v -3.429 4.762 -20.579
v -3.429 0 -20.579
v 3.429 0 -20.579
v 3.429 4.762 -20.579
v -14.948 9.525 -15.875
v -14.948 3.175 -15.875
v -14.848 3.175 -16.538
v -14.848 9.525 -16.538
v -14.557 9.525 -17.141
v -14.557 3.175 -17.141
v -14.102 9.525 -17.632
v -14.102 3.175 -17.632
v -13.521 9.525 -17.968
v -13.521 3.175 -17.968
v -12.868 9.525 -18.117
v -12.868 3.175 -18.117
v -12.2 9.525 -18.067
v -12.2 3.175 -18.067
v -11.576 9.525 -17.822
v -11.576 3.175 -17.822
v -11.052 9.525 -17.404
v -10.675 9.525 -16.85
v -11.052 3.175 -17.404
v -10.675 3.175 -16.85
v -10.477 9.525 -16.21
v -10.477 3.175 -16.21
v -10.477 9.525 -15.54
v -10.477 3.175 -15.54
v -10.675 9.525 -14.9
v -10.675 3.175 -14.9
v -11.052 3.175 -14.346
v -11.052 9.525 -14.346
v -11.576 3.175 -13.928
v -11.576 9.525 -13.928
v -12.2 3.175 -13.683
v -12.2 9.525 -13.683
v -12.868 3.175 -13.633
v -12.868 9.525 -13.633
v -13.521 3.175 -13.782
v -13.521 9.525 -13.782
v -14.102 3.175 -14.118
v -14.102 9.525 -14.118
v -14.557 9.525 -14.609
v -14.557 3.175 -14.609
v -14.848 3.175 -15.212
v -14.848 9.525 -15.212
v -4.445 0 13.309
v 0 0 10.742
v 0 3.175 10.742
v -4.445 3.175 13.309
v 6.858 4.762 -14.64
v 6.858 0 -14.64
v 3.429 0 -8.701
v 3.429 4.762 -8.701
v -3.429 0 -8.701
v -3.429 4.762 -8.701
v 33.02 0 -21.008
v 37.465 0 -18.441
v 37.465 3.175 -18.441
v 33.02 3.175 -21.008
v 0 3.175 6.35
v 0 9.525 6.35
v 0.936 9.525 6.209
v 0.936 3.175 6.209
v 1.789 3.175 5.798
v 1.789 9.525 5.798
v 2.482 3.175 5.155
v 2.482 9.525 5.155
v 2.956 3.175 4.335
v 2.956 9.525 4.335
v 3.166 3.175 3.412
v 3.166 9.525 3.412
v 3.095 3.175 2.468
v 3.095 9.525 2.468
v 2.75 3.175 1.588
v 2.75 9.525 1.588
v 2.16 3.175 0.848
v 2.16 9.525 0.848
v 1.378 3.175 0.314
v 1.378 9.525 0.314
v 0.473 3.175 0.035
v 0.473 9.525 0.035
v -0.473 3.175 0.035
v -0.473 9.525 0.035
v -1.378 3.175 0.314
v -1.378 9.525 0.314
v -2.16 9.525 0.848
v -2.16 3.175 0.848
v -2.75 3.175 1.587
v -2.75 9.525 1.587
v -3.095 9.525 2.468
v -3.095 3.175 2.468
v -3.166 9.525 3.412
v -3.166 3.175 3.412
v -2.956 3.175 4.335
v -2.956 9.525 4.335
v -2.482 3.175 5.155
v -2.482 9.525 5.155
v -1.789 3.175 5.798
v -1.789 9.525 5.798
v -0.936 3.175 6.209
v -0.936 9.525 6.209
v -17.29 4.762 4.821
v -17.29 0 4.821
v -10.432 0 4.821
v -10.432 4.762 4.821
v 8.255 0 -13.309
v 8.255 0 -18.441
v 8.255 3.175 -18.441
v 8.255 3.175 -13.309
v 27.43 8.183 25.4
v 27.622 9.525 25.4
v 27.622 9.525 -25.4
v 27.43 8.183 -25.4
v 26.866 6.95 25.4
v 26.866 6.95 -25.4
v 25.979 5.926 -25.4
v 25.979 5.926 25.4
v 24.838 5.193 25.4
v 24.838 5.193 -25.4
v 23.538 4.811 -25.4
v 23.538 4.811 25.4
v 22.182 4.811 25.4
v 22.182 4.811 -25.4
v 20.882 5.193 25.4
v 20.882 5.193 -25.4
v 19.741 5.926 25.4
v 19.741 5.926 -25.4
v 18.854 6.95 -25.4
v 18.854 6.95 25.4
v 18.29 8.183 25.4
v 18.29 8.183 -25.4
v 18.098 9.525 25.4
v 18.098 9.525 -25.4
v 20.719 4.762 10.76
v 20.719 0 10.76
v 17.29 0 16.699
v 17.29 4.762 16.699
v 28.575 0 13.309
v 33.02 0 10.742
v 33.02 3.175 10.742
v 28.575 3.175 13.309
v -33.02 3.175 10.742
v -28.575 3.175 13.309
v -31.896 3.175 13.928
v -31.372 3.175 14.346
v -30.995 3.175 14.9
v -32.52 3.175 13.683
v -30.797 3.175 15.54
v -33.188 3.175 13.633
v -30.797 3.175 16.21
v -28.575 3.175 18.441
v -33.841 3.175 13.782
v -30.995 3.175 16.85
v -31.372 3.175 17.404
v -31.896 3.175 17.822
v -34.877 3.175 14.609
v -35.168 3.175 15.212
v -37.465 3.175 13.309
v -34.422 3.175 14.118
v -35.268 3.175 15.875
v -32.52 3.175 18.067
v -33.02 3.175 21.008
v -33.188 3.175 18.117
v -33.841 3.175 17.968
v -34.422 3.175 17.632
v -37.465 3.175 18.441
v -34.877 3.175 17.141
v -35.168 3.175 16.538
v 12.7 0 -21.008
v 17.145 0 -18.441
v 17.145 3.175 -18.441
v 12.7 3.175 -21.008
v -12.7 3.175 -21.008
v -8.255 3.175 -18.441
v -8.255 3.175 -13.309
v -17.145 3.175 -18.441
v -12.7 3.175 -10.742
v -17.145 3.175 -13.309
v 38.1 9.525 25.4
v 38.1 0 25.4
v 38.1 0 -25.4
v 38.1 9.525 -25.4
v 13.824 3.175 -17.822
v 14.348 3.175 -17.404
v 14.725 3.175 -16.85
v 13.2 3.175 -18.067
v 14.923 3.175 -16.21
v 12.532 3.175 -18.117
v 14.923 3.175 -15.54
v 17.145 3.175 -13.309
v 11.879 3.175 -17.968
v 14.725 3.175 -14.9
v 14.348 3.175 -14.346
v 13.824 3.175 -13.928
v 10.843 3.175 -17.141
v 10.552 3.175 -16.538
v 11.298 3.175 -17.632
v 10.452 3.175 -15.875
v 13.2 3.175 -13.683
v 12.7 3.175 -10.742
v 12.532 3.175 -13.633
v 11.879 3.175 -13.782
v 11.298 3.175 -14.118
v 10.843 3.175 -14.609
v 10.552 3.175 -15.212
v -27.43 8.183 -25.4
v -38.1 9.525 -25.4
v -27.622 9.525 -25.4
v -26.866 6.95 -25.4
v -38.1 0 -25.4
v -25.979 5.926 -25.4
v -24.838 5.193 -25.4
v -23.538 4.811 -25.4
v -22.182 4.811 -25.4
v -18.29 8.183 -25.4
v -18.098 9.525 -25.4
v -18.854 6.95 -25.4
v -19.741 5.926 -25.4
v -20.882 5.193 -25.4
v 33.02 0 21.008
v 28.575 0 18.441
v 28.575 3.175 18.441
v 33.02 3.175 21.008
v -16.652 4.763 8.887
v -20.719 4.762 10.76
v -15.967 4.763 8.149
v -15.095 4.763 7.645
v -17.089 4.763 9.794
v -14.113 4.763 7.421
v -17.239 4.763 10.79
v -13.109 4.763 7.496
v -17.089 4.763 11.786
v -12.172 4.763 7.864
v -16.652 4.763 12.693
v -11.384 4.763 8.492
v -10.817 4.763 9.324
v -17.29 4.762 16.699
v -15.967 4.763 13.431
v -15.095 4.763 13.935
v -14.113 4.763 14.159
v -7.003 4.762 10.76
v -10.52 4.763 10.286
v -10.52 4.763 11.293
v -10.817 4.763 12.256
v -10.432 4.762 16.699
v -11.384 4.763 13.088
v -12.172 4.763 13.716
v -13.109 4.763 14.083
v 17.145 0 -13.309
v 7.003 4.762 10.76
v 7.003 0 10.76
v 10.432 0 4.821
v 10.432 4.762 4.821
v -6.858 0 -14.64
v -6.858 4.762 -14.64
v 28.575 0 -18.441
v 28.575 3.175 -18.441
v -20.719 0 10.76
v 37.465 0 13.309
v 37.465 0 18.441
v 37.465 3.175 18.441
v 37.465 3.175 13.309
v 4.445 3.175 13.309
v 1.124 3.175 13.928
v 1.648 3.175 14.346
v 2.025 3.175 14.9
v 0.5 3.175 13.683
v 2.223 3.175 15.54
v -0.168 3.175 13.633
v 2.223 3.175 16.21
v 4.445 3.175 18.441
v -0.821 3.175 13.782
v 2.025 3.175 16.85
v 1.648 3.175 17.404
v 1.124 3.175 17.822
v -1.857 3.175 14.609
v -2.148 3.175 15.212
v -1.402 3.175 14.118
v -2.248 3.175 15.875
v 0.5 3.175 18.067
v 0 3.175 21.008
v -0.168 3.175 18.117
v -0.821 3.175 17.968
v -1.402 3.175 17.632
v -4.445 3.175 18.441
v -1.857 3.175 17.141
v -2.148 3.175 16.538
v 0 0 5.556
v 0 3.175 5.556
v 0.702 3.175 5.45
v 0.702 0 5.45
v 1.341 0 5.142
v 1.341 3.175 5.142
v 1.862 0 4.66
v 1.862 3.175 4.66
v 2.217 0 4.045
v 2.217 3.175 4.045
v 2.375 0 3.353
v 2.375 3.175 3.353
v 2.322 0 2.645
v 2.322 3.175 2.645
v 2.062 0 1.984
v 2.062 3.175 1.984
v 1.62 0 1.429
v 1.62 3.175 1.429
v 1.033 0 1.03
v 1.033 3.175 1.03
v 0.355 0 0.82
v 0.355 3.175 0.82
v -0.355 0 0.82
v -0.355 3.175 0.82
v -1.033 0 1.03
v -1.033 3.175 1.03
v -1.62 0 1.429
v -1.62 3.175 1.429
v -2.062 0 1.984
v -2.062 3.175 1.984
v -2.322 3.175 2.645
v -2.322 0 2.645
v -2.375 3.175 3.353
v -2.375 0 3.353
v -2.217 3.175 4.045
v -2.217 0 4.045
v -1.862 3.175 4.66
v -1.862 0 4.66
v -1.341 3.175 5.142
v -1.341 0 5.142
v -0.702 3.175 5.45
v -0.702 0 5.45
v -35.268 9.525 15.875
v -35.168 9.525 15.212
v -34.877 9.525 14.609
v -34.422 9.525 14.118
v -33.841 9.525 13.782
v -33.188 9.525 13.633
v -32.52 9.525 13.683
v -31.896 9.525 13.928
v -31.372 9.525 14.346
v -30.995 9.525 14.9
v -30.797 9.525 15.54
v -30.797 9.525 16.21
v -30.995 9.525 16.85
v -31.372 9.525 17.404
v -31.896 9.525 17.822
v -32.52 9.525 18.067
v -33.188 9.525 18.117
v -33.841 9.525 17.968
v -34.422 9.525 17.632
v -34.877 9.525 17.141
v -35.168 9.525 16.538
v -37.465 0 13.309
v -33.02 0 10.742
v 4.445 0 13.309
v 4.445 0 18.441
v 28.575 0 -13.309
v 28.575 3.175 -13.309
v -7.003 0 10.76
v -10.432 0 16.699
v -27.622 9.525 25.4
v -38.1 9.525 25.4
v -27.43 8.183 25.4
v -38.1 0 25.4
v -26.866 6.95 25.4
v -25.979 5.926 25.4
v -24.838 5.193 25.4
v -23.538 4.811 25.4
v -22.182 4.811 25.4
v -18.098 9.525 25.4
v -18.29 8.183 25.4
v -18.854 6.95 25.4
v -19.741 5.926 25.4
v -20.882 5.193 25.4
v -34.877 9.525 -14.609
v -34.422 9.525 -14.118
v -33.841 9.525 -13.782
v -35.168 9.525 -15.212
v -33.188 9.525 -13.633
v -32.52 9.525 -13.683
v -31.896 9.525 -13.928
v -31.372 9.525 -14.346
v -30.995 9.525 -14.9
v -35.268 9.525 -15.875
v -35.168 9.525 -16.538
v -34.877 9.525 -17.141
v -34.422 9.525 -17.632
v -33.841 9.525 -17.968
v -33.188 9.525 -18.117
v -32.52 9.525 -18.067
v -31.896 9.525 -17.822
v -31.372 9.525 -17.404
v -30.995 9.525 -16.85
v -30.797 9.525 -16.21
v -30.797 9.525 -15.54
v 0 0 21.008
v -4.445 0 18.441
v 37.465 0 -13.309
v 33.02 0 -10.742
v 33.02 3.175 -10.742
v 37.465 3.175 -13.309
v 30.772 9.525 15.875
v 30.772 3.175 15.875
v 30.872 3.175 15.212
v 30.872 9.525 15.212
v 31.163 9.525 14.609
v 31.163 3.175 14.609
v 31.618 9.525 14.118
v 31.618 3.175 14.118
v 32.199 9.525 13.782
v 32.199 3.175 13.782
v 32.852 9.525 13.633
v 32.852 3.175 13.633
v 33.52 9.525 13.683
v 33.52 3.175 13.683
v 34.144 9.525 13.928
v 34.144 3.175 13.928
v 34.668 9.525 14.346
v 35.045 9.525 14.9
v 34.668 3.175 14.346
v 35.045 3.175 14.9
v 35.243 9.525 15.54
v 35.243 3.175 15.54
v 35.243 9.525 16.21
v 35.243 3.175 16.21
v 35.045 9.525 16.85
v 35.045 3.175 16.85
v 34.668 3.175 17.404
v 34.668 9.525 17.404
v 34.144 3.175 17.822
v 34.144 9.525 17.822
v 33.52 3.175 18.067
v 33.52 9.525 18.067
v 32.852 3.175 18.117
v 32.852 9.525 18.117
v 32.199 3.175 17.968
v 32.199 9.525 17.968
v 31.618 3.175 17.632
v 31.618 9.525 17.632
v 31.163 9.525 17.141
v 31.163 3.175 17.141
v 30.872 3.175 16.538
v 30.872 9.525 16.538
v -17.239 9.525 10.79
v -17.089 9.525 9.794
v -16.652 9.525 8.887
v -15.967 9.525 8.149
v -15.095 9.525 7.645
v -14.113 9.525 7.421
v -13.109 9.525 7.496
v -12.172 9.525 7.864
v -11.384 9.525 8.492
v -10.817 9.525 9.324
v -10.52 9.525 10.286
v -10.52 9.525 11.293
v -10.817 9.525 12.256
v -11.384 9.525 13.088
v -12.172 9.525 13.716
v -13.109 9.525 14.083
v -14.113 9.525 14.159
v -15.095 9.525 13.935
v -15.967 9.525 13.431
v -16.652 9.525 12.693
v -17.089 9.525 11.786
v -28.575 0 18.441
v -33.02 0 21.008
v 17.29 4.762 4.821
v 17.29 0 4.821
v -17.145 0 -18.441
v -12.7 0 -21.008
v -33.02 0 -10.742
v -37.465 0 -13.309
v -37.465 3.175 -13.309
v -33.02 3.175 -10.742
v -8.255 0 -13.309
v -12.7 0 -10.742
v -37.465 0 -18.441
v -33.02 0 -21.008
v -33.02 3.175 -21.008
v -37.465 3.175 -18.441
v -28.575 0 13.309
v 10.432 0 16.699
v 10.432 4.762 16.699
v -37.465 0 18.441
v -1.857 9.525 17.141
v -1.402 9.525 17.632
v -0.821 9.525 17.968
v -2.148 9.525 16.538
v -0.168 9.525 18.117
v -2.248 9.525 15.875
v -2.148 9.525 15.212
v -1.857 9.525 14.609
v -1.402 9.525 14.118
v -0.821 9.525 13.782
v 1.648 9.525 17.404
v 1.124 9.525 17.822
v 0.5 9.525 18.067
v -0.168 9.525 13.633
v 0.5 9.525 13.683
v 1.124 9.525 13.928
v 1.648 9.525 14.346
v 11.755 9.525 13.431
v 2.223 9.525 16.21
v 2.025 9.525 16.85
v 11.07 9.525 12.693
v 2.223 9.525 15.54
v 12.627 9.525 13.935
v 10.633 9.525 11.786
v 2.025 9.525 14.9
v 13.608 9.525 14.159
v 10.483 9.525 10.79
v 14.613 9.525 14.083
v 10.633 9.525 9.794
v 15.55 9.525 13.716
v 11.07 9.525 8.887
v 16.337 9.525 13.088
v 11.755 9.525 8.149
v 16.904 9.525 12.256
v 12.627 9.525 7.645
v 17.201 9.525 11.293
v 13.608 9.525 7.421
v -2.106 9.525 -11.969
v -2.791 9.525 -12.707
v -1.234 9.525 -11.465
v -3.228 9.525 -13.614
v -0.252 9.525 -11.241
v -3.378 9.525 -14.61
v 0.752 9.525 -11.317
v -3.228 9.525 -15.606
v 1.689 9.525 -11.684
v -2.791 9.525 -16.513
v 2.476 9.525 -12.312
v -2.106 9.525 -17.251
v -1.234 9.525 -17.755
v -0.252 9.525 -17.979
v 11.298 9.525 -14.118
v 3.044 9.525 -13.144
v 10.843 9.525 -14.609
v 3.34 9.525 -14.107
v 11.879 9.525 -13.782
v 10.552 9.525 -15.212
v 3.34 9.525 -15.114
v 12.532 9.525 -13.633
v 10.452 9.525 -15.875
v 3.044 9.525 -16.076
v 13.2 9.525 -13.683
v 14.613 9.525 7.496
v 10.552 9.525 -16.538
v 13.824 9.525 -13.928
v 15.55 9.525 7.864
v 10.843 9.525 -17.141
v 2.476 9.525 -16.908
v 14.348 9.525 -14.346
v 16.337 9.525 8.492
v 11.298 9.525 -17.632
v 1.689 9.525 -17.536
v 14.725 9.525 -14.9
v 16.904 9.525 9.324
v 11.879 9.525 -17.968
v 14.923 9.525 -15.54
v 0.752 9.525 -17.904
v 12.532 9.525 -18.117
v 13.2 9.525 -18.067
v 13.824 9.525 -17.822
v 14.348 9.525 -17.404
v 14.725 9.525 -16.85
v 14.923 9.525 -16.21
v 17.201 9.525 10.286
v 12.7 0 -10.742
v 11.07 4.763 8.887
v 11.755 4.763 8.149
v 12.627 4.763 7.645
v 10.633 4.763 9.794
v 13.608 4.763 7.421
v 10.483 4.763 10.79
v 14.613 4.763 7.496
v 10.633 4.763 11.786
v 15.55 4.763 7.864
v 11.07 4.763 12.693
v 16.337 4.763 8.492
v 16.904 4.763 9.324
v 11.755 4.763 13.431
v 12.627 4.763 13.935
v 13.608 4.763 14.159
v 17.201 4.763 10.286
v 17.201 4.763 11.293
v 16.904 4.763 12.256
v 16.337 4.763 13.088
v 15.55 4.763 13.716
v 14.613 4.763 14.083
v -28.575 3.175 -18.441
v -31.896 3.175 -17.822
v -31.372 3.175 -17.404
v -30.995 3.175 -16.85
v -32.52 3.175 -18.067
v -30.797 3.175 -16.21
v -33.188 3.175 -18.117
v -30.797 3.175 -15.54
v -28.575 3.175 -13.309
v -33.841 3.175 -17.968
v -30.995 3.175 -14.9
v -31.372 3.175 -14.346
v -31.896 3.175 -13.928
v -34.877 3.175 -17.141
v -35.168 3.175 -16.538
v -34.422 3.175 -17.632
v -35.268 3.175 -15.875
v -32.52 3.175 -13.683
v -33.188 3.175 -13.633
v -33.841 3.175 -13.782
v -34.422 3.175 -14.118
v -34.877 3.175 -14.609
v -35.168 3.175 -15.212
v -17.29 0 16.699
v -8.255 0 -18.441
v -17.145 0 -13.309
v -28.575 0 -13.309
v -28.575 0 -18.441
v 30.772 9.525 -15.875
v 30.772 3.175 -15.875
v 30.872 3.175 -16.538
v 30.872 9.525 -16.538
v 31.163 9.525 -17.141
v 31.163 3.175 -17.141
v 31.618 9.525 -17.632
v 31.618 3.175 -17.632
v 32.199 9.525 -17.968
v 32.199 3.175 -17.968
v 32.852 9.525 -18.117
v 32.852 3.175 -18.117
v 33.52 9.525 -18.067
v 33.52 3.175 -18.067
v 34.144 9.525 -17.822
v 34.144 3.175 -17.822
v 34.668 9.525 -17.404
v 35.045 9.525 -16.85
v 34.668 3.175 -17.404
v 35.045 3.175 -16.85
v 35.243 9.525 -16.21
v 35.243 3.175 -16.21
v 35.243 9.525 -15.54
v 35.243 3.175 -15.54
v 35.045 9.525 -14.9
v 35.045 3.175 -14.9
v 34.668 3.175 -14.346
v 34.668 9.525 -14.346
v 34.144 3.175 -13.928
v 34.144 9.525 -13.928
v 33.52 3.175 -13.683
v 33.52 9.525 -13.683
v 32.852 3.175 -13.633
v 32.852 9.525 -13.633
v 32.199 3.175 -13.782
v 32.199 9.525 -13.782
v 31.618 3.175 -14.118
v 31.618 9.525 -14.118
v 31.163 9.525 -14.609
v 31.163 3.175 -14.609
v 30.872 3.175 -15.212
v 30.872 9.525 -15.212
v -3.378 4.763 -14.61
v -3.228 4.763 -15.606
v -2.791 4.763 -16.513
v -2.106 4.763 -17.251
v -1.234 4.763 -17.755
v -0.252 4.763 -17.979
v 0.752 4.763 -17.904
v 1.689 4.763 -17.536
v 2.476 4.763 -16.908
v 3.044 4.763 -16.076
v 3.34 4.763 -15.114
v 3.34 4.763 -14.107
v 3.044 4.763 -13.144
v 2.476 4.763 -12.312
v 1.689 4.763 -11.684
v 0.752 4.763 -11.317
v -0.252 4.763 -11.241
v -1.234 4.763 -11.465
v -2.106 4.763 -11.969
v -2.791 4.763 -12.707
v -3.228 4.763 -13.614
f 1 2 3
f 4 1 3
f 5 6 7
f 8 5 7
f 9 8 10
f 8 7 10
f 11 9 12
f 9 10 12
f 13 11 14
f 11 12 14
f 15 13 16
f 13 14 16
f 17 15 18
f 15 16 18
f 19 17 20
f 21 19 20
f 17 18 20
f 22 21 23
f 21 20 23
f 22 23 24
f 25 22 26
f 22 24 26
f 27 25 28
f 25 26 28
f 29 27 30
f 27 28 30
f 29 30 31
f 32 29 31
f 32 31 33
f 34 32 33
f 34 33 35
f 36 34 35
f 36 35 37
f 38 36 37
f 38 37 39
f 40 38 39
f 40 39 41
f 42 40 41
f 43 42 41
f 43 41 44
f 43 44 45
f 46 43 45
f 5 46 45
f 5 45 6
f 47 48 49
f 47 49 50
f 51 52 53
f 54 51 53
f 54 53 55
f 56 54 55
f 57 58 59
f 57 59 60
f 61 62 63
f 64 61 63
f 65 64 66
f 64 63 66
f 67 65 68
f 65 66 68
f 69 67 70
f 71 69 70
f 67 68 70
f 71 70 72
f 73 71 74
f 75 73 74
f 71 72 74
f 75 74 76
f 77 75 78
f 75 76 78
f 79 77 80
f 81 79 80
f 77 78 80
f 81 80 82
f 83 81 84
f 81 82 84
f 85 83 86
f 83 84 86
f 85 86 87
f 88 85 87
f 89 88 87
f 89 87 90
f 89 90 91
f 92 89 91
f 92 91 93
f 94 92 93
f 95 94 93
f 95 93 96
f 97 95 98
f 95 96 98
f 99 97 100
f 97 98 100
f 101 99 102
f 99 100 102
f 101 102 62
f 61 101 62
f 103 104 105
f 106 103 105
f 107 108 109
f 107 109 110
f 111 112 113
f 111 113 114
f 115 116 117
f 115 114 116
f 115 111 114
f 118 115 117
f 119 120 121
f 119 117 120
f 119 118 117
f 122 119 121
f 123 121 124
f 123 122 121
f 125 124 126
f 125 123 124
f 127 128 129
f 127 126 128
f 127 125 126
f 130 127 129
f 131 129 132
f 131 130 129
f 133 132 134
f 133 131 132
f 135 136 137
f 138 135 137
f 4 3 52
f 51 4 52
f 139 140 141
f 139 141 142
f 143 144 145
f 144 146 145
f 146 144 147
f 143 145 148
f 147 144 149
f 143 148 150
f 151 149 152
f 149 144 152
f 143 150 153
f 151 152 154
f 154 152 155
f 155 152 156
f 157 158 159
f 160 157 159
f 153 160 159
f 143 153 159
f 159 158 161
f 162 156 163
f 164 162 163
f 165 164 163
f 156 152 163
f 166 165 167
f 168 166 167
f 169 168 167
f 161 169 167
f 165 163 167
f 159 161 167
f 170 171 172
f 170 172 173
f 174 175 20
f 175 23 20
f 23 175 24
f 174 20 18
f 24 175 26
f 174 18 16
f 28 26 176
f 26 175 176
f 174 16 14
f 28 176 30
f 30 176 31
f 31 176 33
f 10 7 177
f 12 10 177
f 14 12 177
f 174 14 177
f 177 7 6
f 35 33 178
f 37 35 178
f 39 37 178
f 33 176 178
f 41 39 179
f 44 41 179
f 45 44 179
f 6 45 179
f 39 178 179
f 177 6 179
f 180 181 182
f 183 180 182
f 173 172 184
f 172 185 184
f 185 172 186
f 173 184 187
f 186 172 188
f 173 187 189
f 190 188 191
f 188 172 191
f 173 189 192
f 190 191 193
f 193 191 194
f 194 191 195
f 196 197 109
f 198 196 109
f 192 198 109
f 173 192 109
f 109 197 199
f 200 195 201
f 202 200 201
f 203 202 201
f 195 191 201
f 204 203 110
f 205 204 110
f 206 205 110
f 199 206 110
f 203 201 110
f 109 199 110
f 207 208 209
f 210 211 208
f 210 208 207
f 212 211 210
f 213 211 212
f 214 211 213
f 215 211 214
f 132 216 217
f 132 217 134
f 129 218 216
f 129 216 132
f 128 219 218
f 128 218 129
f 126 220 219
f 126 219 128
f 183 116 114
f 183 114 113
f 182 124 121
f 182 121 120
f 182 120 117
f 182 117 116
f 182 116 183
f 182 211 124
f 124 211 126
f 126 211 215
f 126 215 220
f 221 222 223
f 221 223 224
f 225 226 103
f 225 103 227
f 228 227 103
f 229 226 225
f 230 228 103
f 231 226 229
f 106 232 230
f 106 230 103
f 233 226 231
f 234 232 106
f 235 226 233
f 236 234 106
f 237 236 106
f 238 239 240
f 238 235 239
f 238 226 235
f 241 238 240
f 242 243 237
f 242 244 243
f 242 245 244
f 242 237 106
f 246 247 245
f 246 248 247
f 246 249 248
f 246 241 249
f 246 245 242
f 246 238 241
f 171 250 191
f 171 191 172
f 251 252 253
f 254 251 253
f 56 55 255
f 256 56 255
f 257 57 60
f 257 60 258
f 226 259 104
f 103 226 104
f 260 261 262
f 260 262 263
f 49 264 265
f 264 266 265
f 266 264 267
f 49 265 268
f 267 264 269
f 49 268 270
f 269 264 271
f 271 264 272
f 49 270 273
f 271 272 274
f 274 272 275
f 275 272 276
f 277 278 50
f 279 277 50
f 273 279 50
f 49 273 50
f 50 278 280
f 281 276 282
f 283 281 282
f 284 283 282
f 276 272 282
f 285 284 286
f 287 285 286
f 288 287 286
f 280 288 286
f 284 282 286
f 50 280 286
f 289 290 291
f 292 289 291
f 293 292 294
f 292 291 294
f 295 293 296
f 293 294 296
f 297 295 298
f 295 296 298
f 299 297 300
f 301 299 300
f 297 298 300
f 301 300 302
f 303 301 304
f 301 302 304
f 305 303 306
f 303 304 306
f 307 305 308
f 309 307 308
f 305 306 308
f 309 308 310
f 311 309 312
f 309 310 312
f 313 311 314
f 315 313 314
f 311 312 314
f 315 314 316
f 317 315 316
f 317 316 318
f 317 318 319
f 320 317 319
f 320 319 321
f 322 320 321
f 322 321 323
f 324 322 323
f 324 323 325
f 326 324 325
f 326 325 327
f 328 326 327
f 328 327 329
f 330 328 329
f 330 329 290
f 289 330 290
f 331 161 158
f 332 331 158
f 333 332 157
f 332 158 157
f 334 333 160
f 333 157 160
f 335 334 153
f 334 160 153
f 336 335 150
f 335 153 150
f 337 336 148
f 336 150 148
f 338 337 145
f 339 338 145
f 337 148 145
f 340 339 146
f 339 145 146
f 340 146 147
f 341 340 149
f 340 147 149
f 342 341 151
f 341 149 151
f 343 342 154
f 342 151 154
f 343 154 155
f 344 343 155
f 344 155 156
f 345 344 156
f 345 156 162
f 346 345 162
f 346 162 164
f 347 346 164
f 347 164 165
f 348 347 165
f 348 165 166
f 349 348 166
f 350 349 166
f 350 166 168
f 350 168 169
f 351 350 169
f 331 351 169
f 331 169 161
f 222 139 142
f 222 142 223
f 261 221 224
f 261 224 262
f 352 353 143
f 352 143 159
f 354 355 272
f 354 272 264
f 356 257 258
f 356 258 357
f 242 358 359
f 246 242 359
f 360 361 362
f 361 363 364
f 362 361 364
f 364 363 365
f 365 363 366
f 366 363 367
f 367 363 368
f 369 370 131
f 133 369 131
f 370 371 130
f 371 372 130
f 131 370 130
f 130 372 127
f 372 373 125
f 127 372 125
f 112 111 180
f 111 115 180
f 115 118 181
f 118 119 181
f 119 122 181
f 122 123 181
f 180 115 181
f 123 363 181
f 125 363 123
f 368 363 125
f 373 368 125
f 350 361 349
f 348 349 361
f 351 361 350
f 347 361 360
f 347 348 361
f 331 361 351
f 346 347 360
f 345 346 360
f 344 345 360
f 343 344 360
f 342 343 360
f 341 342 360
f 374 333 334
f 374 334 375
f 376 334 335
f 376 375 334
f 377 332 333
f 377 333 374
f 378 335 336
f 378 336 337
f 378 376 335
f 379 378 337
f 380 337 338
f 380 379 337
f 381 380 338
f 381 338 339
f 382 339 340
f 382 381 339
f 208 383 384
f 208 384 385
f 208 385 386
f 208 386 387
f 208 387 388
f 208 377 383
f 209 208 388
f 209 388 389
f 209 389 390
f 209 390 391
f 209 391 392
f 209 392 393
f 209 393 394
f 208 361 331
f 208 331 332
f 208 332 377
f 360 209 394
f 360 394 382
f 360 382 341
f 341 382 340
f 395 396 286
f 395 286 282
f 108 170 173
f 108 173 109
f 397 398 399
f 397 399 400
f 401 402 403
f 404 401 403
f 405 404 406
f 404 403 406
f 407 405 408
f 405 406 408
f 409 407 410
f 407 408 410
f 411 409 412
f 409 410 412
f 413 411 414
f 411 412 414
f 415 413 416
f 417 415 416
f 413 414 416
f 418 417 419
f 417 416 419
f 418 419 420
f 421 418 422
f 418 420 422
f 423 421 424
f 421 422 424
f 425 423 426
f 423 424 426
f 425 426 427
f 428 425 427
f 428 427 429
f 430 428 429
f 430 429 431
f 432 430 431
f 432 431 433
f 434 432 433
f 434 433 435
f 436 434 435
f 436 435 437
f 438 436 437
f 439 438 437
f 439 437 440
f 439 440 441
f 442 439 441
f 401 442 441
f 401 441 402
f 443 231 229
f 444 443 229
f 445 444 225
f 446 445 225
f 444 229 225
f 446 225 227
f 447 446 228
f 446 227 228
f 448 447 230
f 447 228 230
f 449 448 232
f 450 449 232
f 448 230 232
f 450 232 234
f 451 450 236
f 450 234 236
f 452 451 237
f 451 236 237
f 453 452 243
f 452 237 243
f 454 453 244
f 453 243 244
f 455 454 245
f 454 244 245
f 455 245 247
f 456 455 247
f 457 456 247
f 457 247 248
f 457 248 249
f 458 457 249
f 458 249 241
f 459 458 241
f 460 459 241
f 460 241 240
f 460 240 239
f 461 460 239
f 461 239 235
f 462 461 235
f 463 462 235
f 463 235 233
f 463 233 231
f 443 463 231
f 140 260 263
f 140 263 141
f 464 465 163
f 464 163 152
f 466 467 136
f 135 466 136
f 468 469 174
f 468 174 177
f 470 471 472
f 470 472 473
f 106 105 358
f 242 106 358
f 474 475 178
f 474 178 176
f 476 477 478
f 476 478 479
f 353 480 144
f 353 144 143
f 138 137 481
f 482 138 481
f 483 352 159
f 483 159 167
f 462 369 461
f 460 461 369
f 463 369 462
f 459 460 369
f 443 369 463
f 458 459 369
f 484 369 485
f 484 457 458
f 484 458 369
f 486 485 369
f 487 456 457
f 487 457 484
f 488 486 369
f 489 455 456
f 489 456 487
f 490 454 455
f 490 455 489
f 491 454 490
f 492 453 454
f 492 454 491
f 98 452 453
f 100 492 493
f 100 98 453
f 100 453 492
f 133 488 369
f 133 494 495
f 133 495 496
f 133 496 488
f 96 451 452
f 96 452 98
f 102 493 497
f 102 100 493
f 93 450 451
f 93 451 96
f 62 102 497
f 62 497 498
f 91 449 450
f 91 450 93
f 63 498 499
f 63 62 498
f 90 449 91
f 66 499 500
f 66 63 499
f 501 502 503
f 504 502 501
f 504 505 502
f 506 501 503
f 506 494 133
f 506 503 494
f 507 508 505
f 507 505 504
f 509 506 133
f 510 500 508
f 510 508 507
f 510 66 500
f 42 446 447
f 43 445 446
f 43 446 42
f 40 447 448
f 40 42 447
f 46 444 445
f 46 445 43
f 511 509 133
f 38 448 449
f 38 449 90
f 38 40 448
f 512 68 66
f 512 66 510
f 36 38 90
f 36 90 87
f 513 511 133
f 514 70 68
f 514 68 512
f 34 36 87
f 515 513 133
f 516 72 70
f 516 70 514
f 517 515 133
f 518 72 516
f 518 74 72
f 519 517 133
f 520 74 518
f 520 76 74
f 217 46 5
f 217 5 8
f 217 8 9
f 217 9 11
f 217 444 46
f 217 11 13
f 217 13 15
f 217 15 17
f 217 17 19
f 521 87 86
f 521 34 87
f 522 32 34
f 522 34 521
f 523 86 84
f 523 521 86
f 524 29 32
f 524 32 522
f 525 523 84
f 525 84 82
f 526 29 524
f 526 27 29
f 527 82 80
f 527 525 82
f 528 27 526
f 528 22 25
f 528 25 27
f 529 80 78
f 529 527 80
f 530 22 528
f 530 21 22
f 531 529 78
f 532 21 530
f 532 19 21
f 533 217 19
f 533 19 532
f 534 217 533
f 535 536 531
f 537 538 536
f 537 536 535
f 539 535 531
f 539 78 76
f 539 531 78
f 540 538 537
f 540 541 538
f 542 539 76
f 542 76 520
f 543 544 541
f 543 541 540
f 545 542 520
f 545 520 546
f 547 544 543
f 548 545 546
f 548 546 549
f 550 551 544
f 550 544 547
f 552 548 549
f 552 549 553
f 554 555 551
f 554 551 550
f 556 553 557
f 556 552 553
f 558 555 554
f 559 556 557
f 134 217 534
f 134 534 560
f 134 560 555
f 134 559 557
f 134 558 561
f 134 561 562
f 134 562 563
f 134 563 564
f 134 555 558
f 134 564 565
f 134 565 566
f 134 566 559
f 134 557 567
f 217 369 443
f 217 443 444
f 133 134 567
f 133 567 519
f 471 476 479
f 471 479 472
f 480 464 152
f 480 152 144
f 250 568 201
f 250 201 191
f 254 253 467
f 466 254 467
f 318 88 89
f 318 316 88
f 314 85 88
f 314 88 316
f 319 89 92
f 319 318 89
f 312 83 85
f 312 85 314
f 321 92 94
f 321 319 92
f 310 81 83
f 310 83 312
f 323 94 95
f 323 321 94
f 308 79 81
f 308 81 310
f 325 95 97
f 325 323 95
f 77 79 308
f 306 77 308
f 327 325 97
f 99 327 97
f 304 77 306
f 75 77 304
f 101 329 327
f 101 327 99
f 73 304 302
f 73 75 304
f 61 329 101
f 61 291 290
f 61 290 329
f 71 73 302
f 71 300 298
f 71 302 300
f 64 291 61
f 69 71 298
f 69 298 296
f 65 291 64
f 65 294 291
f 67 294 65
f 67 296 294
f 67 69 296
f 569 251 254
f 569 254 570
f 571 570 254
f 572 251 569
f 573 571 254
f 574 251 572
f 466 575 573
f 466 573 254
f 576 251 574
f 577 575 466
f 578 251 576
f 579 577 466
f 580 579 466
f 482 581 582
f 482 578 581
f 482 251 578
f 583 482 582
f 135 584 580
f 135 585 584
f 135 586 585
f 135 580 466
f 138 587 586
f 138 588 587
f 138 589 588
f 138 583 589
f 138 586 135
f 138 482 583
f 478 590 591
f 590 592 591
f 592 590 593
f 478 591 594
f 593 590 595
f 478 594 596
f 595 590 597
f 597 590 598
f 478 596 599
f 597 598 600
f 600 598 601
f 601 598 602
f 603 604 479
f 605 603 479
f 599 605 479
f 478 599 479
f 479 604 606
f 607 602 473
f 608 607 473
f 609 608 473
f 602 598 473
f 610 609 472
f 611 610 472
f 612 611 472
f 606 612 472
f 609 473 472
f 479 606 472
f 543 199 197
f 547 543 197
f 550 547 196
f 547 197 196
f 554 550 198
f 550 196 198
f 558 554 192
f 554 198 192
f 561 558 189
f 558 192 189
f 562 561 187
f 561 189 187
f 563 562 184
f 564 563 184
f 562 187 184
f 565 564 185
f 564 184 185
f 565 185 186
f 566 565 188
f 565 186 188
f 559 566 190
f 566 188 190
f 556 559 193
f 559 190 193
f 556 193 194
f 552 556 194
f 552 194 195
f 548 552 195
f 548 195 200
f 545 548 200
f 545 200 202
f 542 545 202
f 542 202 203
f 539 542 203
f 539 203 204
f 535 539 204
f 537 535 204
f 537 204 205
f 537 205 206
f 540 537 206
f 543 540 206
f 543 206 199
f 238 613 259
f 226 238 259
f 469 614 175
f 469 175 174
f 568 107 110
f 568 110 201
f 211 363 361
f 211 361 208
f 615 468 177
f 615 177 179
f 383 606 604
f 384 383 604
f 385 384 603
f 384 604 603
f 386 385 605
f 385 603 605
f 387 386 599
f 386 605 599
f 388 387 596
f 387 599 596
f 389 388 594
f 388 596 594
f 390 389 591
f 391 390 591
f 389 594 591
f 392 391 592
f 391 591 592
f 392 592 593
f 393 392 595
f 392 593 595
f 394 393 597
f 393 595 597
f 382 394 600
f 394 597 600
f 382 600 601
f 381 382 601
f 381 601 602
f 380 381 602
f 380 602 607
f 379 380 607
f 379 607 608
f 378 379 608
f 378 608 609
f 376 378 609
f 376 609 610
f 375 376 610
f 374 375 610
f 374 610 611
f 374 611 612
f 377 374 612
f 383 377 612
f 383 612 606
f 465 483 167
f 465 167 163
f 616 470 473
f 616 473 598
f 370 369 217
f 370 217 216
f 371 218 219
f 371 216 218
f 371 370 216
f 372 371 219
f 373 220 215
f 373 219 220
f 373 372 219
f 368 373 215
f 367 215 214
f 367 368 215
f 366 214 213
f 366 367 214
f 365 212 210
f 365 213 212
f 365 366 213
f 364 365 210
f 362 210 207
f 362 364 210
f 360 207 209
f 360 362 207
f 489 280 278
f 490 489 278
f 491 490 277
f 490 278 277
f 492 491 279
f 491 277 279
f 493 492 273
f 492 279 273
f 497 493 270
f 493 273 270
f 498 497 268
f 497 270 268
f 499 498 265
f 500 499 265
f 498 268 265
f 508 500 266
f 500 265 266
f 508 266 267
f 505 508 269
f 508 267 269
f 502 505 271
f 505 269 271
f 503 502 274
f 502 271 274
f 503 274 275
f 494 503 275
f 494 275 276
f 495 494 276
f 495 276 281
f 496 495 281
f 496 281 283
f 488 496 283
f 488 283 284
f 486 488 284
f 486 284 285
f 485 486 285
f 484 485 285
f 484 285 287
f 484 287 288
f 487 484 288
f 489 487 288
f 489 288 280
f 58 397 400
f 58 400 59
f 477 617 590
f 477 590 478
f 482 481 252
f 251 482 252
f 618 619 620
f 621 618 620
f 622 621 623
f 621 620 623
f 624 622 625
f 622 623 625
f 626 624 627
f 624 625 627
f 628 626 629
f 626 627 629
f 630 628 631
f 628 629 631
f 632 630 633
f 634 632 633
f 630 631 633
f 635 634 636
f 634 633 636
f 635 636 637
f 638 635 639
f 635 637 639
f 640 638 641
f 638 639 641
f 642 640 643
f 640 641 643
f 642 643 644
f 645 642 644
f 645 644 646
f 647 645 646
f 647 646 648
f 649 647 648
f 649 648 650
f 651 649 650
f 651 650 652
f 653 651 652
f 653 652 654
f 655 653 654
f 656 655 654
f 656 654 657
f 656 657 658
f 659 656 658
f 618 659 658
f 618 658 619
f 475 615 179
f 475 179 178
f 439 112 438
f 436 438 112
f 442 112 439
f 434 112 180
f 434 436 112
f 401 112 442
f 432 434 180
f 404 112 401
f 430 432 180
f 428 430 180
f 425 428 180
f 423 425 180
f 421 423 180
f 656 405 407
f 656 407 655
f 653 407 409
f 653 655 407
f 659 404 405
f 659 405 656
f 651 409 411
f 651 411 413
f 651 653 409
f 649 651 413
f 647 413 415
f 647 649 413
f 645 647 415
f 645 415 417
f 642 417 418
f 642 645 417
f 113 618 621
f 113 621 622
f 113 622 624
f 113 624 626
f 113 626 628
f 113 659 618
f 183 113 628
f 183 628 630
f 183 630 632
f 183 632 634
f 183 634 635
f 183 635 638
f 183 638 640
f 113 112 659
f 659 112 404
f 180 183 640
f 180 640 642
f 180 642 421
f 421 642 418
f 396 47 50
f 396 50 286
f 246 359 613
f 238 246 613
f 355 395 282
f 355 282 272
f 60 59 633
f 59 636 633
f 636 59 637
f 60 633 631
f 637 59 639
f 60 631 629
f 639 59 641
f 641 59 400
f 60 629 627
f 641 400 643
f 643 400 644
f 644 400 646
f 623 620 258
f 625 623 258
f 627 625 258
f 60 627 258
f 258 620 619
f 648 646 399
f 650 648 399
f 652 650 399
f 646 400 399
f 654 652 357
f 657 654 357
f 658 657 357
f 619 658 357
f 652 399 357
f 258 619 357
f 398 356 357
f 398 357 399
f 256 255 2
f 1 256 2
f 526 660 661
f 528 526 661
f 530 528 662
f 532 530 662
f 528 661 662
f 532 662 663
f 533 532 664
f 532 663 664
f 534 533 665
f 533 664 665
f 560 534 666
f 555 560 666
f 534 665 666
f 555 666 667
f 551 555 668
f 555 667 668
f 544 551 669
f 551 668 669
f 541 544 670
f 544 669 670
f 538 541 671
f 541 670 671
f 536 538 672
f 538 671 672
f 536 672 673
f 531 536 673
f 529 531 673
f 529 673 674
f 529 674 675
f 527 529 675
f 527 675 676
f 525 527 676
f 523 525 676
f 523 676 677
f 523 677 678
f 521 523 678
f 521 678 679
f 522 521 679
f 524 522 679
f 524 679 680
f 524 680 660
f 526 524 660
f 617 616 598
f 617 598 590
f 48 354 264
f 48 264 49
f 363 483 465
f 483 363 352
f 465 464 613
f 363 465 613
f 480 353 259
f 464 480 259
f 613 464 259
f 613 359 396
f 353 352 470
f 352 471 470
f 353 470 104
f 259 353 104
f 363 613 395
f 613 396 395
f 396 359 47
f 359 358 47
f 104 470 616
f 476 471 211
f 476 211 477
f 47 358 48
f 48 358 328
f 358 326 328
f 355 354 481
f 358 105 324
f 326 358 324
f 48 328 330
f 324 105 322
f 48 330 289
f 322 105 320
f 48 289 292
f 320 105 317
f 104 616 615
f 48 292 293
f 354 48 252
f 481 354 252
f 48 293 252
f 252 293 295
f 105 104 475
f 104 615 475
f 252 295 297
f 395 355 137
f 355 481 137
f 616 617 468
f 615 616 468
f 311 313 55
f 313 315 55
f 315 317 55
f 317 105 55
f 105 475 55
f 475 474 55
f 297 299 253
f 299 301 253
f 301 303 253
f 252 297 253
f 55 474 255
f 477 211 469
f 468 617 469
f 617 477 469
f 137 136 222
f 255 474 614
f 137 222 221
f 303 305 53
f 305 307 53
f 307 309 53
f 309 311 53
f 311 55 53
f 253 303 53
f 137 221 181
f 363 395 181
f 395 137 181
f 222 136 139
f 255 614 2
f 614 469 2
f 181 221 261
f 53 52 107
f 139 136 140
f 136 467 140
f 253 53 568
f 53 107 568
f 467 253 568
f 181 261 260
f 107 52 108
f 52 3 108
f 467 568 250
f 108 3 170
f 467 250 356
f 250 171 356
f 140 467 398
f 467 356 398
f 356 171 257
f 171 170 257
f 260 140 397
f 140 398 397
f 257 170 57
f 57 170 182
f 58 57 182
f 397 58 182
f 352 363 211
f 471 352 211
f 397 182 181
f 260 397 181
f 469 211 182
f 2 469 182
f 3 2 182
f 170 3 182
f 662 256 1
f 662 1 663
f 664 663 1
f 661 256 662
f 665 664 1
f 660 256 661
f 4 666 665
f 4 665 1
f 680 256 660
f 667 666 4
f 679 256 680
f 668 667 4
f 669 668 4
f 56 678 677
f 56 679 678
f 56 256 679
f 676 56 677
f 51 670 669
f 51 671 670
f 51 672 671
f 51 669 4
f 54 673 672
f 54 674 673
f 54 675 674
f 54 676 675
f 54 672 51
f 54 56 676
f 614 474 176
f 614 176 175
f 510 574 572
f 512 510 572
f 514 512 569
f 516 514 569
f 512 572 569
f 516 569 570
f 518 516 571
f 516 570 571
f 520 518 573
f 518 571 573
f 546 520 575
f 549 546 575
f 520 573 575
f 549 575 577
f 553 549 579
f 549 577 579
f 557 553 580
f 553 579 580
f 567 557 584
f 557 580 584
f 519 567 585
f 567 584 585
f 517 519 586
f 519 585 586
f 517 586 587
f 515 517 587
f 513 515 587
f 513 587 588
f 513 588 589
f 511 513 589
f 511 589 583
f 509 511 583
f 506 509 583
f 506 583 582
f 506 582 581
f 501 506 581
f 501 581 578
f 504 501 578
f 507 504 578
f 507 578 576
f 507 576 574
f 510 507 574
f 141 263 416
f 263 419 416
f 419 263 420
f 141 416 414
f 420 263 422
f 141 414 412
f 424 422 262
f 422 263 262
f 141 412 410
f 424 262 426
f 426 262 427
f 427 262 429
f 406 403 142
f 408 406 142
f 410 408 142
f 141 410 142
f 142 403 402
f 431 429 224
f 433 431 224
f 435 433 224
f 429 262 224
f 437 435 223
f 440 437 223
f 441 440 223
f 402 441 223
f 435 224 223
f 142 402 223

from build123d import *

# Parameters (mm, degrees)
SKETCH1_W               = 76.2
SKETCH1_H               = 50.8
BOSS_EXTRUDE1_DEPTH     = 9.525
F_1_4_CLEARANCE_HOLE1_D = 6.7564
CUT_EXTRUDE1_DEPTH      = 65.210401221
SKETCH5_R               = 2.38125
CUT_EXTRUDE2_DEPTH      = 47.770670564
F_8_CLEARANCE_HOLE1_D   = 4.4958
CUT_EXTRUDE3_DEPTH      = 4.7625
CUT_EXTRUDE4_DEPTH      = 3.175
SKETCH11_R              = 3.175
CUT_EXTRUDE5_DEPTH      = 6.35


with BuildPart() as part:
    # Sketch1 → Boss-Extrude1 (new body)
    with BuildSketch(Plane(origin=(0, 0, 0), x_dir=(1, 0, 0), z_dir=(0, 1, 0))):
        Rectangle(SKETCH1_W, SKETCH1_H)
    extrude(amount=BOSS_EXTRUDE1_DEPTH)

    # 1/4 Clearance Hole1 (through all)
    with Locations(Plane(origin=(0, 9.525, 0), x_dir=(1, 0, 0), z_dir=(0, 1, 0))):
        with Locations((0, 14.61008), (-13.86078, -10.78992), (13.86078, -10.78992)):
            Hole(F_1_4_CLEARANCE_HOLE1_D / 2)

    # Sketch4 → Cut-Extrude1 (cut, through all)
    with BuildSketch(Plane.XY.offset(25.4)):
        with BuildLine():
            Line((-27.6225, 9.525), (-18.0975, 9.525))
            ThreePointArc((-18.0975, 9.525), (-22.86, 4.7625), (-27.6225, 9.525))
        make_face()
        with BuildLine():
            Line((18.0975, 9.525), (27.6225, 9.525))
            ThreePointArc((27.6225, 9.525), (22.86, 4.7625), (18.0975, 9.525))
        make_face()
    extrude(amount=-CUT_EXTRUDE1_DEPTH, mode=Mode.SUBTRACT)

    # Sketch5 → Cut-Extrude2 (cut, through all)
    with BuildSketch(Plane(origin=(0, 9.525, 0), x_dir=(1, 0, 0), z_dir=(0, 1, 0))):
        with Locations(Location((0, -3.175, 0), (0, 0, 270))):
            Circle(SKETCH5_R)
    extrude(amount=-CUT_EXTRUDE2_DEPTH, mode=Mode.SUBTRACT)

    # #8 Clearance Hole1 (through all)
    with Locations(Plane(origin=(0, 9.525, 0), x_dir=(1, 0, 0), z_dir=(0, 1, 0))):
        with Locations((-33.02, 15.875), (-33.02, -15.875), (33.02, -15.875), (33.02, 15.875), (-12.7, 15.875), (12.7, 15.875), (0, -15.875)):
            Hole(F_8_CLEARANCE_HOLE1_D / 2)

    # Sketch8 → Cut-Extrude3 (cut)
    with BuildSketch(Plane.XZ):
        Polygon((-17.28978, 4.82092), (-10.43178, 4.82092), (-7.00278, 10.760122219), (-10.43178, 16.699324438), (-17.28978, 16.699324438), (-20.71878, 10.760122219), align=None)
        Polygon((10.43178, 4.82092), (17.28978, 4.82092), (20.71878, 10.760122219), (17.28978, 16.699324438), (10.43178, 16.699324438), (7.00278, 10.760122219), align=None)
        Polygon((-3.429, -20.57908), (3.429, -20.57908), (6.858, -14.639877781), (3.429, -8.700675562), (-3.429, -8.700675562), (-6.858, -14.639877781), align=None)
    extrude(amount=-CUT_EXTRUDE3_DEPTH, mode=Mode.SUBTRACT)

    # Sketch9 → Cut-Extrude4 (cut)
    with BuildSketch(Plane.XZ):
        Polygon((-37.465, 13.308678053), (-37.465, 18.441321947), (-33.02, 21.007643893), (-28.575, 18.441321947), (-28.575, 13.308678053), (-33.02, 10.742356107), align=None)
        Polygon((-4.445, 13.308678053), (-4.445, 18.441321947), (0, 21.007643893), (4.445, 18.441321947), (4.445, 13.308678053), (0, 10.742356107), align=None)
        Polygon((28.575, 13.308678053), (28.575, 18.441321947), (33.02, 21.007643893), (37.465, 18.441321947), (37.465, 13.308678053), (33.02, 10.742356107), align=None)
        Polygon((28.575, -18.441321947), (28.575, -13.308678053), (33.02, -10.742356107), (37.465, -13.308678053), (37.465, -18.441321947), (33.02, -21.007643893), align=None)
        Polygon((8.255, -18.441321947), (8.255, -13.308678053), (12.7, -10.742356107), (17.145, -13.308678053), (17.145, -18.441321947), (12.7, -21.007643893), align=None)
        Polygon((-17.145, -18.441321947), (-17.145, -13.308678053), (-12.7, -10.742356107), (-8.255, -13.308678053), (-8.255, -18.441321947), (-12.7, -21.007643893), align=None)
        Polygon((-37.465, -18.441321947), (-37.465, -13.308678053), (-33.02, -10.742356107), (-28.575, -13.308678053), (-28.575, -18.441321947), (-33.02, -21.007643893), align=None)
    extrude(amount=-CUT_EXTRUDE4_DEPTH, mode=Mode.SUBTRACT)

    # Sketch11 → Cut-Extrude5 (cut)
    with BuildSketch(Plane(origin=(0, 9.525, 0), x_dir=(1, 0, 0), z_dir=(0, 1, 0))):
        with Locations(Location((0, -3.175, 0), (0, 0, 270))):
            Circle(SKETCH11_R)
    extrude(amount=-CUT_EXTRUDE5_DEPTH, mode=Mode.SUBTRACT)


solid = part.part
